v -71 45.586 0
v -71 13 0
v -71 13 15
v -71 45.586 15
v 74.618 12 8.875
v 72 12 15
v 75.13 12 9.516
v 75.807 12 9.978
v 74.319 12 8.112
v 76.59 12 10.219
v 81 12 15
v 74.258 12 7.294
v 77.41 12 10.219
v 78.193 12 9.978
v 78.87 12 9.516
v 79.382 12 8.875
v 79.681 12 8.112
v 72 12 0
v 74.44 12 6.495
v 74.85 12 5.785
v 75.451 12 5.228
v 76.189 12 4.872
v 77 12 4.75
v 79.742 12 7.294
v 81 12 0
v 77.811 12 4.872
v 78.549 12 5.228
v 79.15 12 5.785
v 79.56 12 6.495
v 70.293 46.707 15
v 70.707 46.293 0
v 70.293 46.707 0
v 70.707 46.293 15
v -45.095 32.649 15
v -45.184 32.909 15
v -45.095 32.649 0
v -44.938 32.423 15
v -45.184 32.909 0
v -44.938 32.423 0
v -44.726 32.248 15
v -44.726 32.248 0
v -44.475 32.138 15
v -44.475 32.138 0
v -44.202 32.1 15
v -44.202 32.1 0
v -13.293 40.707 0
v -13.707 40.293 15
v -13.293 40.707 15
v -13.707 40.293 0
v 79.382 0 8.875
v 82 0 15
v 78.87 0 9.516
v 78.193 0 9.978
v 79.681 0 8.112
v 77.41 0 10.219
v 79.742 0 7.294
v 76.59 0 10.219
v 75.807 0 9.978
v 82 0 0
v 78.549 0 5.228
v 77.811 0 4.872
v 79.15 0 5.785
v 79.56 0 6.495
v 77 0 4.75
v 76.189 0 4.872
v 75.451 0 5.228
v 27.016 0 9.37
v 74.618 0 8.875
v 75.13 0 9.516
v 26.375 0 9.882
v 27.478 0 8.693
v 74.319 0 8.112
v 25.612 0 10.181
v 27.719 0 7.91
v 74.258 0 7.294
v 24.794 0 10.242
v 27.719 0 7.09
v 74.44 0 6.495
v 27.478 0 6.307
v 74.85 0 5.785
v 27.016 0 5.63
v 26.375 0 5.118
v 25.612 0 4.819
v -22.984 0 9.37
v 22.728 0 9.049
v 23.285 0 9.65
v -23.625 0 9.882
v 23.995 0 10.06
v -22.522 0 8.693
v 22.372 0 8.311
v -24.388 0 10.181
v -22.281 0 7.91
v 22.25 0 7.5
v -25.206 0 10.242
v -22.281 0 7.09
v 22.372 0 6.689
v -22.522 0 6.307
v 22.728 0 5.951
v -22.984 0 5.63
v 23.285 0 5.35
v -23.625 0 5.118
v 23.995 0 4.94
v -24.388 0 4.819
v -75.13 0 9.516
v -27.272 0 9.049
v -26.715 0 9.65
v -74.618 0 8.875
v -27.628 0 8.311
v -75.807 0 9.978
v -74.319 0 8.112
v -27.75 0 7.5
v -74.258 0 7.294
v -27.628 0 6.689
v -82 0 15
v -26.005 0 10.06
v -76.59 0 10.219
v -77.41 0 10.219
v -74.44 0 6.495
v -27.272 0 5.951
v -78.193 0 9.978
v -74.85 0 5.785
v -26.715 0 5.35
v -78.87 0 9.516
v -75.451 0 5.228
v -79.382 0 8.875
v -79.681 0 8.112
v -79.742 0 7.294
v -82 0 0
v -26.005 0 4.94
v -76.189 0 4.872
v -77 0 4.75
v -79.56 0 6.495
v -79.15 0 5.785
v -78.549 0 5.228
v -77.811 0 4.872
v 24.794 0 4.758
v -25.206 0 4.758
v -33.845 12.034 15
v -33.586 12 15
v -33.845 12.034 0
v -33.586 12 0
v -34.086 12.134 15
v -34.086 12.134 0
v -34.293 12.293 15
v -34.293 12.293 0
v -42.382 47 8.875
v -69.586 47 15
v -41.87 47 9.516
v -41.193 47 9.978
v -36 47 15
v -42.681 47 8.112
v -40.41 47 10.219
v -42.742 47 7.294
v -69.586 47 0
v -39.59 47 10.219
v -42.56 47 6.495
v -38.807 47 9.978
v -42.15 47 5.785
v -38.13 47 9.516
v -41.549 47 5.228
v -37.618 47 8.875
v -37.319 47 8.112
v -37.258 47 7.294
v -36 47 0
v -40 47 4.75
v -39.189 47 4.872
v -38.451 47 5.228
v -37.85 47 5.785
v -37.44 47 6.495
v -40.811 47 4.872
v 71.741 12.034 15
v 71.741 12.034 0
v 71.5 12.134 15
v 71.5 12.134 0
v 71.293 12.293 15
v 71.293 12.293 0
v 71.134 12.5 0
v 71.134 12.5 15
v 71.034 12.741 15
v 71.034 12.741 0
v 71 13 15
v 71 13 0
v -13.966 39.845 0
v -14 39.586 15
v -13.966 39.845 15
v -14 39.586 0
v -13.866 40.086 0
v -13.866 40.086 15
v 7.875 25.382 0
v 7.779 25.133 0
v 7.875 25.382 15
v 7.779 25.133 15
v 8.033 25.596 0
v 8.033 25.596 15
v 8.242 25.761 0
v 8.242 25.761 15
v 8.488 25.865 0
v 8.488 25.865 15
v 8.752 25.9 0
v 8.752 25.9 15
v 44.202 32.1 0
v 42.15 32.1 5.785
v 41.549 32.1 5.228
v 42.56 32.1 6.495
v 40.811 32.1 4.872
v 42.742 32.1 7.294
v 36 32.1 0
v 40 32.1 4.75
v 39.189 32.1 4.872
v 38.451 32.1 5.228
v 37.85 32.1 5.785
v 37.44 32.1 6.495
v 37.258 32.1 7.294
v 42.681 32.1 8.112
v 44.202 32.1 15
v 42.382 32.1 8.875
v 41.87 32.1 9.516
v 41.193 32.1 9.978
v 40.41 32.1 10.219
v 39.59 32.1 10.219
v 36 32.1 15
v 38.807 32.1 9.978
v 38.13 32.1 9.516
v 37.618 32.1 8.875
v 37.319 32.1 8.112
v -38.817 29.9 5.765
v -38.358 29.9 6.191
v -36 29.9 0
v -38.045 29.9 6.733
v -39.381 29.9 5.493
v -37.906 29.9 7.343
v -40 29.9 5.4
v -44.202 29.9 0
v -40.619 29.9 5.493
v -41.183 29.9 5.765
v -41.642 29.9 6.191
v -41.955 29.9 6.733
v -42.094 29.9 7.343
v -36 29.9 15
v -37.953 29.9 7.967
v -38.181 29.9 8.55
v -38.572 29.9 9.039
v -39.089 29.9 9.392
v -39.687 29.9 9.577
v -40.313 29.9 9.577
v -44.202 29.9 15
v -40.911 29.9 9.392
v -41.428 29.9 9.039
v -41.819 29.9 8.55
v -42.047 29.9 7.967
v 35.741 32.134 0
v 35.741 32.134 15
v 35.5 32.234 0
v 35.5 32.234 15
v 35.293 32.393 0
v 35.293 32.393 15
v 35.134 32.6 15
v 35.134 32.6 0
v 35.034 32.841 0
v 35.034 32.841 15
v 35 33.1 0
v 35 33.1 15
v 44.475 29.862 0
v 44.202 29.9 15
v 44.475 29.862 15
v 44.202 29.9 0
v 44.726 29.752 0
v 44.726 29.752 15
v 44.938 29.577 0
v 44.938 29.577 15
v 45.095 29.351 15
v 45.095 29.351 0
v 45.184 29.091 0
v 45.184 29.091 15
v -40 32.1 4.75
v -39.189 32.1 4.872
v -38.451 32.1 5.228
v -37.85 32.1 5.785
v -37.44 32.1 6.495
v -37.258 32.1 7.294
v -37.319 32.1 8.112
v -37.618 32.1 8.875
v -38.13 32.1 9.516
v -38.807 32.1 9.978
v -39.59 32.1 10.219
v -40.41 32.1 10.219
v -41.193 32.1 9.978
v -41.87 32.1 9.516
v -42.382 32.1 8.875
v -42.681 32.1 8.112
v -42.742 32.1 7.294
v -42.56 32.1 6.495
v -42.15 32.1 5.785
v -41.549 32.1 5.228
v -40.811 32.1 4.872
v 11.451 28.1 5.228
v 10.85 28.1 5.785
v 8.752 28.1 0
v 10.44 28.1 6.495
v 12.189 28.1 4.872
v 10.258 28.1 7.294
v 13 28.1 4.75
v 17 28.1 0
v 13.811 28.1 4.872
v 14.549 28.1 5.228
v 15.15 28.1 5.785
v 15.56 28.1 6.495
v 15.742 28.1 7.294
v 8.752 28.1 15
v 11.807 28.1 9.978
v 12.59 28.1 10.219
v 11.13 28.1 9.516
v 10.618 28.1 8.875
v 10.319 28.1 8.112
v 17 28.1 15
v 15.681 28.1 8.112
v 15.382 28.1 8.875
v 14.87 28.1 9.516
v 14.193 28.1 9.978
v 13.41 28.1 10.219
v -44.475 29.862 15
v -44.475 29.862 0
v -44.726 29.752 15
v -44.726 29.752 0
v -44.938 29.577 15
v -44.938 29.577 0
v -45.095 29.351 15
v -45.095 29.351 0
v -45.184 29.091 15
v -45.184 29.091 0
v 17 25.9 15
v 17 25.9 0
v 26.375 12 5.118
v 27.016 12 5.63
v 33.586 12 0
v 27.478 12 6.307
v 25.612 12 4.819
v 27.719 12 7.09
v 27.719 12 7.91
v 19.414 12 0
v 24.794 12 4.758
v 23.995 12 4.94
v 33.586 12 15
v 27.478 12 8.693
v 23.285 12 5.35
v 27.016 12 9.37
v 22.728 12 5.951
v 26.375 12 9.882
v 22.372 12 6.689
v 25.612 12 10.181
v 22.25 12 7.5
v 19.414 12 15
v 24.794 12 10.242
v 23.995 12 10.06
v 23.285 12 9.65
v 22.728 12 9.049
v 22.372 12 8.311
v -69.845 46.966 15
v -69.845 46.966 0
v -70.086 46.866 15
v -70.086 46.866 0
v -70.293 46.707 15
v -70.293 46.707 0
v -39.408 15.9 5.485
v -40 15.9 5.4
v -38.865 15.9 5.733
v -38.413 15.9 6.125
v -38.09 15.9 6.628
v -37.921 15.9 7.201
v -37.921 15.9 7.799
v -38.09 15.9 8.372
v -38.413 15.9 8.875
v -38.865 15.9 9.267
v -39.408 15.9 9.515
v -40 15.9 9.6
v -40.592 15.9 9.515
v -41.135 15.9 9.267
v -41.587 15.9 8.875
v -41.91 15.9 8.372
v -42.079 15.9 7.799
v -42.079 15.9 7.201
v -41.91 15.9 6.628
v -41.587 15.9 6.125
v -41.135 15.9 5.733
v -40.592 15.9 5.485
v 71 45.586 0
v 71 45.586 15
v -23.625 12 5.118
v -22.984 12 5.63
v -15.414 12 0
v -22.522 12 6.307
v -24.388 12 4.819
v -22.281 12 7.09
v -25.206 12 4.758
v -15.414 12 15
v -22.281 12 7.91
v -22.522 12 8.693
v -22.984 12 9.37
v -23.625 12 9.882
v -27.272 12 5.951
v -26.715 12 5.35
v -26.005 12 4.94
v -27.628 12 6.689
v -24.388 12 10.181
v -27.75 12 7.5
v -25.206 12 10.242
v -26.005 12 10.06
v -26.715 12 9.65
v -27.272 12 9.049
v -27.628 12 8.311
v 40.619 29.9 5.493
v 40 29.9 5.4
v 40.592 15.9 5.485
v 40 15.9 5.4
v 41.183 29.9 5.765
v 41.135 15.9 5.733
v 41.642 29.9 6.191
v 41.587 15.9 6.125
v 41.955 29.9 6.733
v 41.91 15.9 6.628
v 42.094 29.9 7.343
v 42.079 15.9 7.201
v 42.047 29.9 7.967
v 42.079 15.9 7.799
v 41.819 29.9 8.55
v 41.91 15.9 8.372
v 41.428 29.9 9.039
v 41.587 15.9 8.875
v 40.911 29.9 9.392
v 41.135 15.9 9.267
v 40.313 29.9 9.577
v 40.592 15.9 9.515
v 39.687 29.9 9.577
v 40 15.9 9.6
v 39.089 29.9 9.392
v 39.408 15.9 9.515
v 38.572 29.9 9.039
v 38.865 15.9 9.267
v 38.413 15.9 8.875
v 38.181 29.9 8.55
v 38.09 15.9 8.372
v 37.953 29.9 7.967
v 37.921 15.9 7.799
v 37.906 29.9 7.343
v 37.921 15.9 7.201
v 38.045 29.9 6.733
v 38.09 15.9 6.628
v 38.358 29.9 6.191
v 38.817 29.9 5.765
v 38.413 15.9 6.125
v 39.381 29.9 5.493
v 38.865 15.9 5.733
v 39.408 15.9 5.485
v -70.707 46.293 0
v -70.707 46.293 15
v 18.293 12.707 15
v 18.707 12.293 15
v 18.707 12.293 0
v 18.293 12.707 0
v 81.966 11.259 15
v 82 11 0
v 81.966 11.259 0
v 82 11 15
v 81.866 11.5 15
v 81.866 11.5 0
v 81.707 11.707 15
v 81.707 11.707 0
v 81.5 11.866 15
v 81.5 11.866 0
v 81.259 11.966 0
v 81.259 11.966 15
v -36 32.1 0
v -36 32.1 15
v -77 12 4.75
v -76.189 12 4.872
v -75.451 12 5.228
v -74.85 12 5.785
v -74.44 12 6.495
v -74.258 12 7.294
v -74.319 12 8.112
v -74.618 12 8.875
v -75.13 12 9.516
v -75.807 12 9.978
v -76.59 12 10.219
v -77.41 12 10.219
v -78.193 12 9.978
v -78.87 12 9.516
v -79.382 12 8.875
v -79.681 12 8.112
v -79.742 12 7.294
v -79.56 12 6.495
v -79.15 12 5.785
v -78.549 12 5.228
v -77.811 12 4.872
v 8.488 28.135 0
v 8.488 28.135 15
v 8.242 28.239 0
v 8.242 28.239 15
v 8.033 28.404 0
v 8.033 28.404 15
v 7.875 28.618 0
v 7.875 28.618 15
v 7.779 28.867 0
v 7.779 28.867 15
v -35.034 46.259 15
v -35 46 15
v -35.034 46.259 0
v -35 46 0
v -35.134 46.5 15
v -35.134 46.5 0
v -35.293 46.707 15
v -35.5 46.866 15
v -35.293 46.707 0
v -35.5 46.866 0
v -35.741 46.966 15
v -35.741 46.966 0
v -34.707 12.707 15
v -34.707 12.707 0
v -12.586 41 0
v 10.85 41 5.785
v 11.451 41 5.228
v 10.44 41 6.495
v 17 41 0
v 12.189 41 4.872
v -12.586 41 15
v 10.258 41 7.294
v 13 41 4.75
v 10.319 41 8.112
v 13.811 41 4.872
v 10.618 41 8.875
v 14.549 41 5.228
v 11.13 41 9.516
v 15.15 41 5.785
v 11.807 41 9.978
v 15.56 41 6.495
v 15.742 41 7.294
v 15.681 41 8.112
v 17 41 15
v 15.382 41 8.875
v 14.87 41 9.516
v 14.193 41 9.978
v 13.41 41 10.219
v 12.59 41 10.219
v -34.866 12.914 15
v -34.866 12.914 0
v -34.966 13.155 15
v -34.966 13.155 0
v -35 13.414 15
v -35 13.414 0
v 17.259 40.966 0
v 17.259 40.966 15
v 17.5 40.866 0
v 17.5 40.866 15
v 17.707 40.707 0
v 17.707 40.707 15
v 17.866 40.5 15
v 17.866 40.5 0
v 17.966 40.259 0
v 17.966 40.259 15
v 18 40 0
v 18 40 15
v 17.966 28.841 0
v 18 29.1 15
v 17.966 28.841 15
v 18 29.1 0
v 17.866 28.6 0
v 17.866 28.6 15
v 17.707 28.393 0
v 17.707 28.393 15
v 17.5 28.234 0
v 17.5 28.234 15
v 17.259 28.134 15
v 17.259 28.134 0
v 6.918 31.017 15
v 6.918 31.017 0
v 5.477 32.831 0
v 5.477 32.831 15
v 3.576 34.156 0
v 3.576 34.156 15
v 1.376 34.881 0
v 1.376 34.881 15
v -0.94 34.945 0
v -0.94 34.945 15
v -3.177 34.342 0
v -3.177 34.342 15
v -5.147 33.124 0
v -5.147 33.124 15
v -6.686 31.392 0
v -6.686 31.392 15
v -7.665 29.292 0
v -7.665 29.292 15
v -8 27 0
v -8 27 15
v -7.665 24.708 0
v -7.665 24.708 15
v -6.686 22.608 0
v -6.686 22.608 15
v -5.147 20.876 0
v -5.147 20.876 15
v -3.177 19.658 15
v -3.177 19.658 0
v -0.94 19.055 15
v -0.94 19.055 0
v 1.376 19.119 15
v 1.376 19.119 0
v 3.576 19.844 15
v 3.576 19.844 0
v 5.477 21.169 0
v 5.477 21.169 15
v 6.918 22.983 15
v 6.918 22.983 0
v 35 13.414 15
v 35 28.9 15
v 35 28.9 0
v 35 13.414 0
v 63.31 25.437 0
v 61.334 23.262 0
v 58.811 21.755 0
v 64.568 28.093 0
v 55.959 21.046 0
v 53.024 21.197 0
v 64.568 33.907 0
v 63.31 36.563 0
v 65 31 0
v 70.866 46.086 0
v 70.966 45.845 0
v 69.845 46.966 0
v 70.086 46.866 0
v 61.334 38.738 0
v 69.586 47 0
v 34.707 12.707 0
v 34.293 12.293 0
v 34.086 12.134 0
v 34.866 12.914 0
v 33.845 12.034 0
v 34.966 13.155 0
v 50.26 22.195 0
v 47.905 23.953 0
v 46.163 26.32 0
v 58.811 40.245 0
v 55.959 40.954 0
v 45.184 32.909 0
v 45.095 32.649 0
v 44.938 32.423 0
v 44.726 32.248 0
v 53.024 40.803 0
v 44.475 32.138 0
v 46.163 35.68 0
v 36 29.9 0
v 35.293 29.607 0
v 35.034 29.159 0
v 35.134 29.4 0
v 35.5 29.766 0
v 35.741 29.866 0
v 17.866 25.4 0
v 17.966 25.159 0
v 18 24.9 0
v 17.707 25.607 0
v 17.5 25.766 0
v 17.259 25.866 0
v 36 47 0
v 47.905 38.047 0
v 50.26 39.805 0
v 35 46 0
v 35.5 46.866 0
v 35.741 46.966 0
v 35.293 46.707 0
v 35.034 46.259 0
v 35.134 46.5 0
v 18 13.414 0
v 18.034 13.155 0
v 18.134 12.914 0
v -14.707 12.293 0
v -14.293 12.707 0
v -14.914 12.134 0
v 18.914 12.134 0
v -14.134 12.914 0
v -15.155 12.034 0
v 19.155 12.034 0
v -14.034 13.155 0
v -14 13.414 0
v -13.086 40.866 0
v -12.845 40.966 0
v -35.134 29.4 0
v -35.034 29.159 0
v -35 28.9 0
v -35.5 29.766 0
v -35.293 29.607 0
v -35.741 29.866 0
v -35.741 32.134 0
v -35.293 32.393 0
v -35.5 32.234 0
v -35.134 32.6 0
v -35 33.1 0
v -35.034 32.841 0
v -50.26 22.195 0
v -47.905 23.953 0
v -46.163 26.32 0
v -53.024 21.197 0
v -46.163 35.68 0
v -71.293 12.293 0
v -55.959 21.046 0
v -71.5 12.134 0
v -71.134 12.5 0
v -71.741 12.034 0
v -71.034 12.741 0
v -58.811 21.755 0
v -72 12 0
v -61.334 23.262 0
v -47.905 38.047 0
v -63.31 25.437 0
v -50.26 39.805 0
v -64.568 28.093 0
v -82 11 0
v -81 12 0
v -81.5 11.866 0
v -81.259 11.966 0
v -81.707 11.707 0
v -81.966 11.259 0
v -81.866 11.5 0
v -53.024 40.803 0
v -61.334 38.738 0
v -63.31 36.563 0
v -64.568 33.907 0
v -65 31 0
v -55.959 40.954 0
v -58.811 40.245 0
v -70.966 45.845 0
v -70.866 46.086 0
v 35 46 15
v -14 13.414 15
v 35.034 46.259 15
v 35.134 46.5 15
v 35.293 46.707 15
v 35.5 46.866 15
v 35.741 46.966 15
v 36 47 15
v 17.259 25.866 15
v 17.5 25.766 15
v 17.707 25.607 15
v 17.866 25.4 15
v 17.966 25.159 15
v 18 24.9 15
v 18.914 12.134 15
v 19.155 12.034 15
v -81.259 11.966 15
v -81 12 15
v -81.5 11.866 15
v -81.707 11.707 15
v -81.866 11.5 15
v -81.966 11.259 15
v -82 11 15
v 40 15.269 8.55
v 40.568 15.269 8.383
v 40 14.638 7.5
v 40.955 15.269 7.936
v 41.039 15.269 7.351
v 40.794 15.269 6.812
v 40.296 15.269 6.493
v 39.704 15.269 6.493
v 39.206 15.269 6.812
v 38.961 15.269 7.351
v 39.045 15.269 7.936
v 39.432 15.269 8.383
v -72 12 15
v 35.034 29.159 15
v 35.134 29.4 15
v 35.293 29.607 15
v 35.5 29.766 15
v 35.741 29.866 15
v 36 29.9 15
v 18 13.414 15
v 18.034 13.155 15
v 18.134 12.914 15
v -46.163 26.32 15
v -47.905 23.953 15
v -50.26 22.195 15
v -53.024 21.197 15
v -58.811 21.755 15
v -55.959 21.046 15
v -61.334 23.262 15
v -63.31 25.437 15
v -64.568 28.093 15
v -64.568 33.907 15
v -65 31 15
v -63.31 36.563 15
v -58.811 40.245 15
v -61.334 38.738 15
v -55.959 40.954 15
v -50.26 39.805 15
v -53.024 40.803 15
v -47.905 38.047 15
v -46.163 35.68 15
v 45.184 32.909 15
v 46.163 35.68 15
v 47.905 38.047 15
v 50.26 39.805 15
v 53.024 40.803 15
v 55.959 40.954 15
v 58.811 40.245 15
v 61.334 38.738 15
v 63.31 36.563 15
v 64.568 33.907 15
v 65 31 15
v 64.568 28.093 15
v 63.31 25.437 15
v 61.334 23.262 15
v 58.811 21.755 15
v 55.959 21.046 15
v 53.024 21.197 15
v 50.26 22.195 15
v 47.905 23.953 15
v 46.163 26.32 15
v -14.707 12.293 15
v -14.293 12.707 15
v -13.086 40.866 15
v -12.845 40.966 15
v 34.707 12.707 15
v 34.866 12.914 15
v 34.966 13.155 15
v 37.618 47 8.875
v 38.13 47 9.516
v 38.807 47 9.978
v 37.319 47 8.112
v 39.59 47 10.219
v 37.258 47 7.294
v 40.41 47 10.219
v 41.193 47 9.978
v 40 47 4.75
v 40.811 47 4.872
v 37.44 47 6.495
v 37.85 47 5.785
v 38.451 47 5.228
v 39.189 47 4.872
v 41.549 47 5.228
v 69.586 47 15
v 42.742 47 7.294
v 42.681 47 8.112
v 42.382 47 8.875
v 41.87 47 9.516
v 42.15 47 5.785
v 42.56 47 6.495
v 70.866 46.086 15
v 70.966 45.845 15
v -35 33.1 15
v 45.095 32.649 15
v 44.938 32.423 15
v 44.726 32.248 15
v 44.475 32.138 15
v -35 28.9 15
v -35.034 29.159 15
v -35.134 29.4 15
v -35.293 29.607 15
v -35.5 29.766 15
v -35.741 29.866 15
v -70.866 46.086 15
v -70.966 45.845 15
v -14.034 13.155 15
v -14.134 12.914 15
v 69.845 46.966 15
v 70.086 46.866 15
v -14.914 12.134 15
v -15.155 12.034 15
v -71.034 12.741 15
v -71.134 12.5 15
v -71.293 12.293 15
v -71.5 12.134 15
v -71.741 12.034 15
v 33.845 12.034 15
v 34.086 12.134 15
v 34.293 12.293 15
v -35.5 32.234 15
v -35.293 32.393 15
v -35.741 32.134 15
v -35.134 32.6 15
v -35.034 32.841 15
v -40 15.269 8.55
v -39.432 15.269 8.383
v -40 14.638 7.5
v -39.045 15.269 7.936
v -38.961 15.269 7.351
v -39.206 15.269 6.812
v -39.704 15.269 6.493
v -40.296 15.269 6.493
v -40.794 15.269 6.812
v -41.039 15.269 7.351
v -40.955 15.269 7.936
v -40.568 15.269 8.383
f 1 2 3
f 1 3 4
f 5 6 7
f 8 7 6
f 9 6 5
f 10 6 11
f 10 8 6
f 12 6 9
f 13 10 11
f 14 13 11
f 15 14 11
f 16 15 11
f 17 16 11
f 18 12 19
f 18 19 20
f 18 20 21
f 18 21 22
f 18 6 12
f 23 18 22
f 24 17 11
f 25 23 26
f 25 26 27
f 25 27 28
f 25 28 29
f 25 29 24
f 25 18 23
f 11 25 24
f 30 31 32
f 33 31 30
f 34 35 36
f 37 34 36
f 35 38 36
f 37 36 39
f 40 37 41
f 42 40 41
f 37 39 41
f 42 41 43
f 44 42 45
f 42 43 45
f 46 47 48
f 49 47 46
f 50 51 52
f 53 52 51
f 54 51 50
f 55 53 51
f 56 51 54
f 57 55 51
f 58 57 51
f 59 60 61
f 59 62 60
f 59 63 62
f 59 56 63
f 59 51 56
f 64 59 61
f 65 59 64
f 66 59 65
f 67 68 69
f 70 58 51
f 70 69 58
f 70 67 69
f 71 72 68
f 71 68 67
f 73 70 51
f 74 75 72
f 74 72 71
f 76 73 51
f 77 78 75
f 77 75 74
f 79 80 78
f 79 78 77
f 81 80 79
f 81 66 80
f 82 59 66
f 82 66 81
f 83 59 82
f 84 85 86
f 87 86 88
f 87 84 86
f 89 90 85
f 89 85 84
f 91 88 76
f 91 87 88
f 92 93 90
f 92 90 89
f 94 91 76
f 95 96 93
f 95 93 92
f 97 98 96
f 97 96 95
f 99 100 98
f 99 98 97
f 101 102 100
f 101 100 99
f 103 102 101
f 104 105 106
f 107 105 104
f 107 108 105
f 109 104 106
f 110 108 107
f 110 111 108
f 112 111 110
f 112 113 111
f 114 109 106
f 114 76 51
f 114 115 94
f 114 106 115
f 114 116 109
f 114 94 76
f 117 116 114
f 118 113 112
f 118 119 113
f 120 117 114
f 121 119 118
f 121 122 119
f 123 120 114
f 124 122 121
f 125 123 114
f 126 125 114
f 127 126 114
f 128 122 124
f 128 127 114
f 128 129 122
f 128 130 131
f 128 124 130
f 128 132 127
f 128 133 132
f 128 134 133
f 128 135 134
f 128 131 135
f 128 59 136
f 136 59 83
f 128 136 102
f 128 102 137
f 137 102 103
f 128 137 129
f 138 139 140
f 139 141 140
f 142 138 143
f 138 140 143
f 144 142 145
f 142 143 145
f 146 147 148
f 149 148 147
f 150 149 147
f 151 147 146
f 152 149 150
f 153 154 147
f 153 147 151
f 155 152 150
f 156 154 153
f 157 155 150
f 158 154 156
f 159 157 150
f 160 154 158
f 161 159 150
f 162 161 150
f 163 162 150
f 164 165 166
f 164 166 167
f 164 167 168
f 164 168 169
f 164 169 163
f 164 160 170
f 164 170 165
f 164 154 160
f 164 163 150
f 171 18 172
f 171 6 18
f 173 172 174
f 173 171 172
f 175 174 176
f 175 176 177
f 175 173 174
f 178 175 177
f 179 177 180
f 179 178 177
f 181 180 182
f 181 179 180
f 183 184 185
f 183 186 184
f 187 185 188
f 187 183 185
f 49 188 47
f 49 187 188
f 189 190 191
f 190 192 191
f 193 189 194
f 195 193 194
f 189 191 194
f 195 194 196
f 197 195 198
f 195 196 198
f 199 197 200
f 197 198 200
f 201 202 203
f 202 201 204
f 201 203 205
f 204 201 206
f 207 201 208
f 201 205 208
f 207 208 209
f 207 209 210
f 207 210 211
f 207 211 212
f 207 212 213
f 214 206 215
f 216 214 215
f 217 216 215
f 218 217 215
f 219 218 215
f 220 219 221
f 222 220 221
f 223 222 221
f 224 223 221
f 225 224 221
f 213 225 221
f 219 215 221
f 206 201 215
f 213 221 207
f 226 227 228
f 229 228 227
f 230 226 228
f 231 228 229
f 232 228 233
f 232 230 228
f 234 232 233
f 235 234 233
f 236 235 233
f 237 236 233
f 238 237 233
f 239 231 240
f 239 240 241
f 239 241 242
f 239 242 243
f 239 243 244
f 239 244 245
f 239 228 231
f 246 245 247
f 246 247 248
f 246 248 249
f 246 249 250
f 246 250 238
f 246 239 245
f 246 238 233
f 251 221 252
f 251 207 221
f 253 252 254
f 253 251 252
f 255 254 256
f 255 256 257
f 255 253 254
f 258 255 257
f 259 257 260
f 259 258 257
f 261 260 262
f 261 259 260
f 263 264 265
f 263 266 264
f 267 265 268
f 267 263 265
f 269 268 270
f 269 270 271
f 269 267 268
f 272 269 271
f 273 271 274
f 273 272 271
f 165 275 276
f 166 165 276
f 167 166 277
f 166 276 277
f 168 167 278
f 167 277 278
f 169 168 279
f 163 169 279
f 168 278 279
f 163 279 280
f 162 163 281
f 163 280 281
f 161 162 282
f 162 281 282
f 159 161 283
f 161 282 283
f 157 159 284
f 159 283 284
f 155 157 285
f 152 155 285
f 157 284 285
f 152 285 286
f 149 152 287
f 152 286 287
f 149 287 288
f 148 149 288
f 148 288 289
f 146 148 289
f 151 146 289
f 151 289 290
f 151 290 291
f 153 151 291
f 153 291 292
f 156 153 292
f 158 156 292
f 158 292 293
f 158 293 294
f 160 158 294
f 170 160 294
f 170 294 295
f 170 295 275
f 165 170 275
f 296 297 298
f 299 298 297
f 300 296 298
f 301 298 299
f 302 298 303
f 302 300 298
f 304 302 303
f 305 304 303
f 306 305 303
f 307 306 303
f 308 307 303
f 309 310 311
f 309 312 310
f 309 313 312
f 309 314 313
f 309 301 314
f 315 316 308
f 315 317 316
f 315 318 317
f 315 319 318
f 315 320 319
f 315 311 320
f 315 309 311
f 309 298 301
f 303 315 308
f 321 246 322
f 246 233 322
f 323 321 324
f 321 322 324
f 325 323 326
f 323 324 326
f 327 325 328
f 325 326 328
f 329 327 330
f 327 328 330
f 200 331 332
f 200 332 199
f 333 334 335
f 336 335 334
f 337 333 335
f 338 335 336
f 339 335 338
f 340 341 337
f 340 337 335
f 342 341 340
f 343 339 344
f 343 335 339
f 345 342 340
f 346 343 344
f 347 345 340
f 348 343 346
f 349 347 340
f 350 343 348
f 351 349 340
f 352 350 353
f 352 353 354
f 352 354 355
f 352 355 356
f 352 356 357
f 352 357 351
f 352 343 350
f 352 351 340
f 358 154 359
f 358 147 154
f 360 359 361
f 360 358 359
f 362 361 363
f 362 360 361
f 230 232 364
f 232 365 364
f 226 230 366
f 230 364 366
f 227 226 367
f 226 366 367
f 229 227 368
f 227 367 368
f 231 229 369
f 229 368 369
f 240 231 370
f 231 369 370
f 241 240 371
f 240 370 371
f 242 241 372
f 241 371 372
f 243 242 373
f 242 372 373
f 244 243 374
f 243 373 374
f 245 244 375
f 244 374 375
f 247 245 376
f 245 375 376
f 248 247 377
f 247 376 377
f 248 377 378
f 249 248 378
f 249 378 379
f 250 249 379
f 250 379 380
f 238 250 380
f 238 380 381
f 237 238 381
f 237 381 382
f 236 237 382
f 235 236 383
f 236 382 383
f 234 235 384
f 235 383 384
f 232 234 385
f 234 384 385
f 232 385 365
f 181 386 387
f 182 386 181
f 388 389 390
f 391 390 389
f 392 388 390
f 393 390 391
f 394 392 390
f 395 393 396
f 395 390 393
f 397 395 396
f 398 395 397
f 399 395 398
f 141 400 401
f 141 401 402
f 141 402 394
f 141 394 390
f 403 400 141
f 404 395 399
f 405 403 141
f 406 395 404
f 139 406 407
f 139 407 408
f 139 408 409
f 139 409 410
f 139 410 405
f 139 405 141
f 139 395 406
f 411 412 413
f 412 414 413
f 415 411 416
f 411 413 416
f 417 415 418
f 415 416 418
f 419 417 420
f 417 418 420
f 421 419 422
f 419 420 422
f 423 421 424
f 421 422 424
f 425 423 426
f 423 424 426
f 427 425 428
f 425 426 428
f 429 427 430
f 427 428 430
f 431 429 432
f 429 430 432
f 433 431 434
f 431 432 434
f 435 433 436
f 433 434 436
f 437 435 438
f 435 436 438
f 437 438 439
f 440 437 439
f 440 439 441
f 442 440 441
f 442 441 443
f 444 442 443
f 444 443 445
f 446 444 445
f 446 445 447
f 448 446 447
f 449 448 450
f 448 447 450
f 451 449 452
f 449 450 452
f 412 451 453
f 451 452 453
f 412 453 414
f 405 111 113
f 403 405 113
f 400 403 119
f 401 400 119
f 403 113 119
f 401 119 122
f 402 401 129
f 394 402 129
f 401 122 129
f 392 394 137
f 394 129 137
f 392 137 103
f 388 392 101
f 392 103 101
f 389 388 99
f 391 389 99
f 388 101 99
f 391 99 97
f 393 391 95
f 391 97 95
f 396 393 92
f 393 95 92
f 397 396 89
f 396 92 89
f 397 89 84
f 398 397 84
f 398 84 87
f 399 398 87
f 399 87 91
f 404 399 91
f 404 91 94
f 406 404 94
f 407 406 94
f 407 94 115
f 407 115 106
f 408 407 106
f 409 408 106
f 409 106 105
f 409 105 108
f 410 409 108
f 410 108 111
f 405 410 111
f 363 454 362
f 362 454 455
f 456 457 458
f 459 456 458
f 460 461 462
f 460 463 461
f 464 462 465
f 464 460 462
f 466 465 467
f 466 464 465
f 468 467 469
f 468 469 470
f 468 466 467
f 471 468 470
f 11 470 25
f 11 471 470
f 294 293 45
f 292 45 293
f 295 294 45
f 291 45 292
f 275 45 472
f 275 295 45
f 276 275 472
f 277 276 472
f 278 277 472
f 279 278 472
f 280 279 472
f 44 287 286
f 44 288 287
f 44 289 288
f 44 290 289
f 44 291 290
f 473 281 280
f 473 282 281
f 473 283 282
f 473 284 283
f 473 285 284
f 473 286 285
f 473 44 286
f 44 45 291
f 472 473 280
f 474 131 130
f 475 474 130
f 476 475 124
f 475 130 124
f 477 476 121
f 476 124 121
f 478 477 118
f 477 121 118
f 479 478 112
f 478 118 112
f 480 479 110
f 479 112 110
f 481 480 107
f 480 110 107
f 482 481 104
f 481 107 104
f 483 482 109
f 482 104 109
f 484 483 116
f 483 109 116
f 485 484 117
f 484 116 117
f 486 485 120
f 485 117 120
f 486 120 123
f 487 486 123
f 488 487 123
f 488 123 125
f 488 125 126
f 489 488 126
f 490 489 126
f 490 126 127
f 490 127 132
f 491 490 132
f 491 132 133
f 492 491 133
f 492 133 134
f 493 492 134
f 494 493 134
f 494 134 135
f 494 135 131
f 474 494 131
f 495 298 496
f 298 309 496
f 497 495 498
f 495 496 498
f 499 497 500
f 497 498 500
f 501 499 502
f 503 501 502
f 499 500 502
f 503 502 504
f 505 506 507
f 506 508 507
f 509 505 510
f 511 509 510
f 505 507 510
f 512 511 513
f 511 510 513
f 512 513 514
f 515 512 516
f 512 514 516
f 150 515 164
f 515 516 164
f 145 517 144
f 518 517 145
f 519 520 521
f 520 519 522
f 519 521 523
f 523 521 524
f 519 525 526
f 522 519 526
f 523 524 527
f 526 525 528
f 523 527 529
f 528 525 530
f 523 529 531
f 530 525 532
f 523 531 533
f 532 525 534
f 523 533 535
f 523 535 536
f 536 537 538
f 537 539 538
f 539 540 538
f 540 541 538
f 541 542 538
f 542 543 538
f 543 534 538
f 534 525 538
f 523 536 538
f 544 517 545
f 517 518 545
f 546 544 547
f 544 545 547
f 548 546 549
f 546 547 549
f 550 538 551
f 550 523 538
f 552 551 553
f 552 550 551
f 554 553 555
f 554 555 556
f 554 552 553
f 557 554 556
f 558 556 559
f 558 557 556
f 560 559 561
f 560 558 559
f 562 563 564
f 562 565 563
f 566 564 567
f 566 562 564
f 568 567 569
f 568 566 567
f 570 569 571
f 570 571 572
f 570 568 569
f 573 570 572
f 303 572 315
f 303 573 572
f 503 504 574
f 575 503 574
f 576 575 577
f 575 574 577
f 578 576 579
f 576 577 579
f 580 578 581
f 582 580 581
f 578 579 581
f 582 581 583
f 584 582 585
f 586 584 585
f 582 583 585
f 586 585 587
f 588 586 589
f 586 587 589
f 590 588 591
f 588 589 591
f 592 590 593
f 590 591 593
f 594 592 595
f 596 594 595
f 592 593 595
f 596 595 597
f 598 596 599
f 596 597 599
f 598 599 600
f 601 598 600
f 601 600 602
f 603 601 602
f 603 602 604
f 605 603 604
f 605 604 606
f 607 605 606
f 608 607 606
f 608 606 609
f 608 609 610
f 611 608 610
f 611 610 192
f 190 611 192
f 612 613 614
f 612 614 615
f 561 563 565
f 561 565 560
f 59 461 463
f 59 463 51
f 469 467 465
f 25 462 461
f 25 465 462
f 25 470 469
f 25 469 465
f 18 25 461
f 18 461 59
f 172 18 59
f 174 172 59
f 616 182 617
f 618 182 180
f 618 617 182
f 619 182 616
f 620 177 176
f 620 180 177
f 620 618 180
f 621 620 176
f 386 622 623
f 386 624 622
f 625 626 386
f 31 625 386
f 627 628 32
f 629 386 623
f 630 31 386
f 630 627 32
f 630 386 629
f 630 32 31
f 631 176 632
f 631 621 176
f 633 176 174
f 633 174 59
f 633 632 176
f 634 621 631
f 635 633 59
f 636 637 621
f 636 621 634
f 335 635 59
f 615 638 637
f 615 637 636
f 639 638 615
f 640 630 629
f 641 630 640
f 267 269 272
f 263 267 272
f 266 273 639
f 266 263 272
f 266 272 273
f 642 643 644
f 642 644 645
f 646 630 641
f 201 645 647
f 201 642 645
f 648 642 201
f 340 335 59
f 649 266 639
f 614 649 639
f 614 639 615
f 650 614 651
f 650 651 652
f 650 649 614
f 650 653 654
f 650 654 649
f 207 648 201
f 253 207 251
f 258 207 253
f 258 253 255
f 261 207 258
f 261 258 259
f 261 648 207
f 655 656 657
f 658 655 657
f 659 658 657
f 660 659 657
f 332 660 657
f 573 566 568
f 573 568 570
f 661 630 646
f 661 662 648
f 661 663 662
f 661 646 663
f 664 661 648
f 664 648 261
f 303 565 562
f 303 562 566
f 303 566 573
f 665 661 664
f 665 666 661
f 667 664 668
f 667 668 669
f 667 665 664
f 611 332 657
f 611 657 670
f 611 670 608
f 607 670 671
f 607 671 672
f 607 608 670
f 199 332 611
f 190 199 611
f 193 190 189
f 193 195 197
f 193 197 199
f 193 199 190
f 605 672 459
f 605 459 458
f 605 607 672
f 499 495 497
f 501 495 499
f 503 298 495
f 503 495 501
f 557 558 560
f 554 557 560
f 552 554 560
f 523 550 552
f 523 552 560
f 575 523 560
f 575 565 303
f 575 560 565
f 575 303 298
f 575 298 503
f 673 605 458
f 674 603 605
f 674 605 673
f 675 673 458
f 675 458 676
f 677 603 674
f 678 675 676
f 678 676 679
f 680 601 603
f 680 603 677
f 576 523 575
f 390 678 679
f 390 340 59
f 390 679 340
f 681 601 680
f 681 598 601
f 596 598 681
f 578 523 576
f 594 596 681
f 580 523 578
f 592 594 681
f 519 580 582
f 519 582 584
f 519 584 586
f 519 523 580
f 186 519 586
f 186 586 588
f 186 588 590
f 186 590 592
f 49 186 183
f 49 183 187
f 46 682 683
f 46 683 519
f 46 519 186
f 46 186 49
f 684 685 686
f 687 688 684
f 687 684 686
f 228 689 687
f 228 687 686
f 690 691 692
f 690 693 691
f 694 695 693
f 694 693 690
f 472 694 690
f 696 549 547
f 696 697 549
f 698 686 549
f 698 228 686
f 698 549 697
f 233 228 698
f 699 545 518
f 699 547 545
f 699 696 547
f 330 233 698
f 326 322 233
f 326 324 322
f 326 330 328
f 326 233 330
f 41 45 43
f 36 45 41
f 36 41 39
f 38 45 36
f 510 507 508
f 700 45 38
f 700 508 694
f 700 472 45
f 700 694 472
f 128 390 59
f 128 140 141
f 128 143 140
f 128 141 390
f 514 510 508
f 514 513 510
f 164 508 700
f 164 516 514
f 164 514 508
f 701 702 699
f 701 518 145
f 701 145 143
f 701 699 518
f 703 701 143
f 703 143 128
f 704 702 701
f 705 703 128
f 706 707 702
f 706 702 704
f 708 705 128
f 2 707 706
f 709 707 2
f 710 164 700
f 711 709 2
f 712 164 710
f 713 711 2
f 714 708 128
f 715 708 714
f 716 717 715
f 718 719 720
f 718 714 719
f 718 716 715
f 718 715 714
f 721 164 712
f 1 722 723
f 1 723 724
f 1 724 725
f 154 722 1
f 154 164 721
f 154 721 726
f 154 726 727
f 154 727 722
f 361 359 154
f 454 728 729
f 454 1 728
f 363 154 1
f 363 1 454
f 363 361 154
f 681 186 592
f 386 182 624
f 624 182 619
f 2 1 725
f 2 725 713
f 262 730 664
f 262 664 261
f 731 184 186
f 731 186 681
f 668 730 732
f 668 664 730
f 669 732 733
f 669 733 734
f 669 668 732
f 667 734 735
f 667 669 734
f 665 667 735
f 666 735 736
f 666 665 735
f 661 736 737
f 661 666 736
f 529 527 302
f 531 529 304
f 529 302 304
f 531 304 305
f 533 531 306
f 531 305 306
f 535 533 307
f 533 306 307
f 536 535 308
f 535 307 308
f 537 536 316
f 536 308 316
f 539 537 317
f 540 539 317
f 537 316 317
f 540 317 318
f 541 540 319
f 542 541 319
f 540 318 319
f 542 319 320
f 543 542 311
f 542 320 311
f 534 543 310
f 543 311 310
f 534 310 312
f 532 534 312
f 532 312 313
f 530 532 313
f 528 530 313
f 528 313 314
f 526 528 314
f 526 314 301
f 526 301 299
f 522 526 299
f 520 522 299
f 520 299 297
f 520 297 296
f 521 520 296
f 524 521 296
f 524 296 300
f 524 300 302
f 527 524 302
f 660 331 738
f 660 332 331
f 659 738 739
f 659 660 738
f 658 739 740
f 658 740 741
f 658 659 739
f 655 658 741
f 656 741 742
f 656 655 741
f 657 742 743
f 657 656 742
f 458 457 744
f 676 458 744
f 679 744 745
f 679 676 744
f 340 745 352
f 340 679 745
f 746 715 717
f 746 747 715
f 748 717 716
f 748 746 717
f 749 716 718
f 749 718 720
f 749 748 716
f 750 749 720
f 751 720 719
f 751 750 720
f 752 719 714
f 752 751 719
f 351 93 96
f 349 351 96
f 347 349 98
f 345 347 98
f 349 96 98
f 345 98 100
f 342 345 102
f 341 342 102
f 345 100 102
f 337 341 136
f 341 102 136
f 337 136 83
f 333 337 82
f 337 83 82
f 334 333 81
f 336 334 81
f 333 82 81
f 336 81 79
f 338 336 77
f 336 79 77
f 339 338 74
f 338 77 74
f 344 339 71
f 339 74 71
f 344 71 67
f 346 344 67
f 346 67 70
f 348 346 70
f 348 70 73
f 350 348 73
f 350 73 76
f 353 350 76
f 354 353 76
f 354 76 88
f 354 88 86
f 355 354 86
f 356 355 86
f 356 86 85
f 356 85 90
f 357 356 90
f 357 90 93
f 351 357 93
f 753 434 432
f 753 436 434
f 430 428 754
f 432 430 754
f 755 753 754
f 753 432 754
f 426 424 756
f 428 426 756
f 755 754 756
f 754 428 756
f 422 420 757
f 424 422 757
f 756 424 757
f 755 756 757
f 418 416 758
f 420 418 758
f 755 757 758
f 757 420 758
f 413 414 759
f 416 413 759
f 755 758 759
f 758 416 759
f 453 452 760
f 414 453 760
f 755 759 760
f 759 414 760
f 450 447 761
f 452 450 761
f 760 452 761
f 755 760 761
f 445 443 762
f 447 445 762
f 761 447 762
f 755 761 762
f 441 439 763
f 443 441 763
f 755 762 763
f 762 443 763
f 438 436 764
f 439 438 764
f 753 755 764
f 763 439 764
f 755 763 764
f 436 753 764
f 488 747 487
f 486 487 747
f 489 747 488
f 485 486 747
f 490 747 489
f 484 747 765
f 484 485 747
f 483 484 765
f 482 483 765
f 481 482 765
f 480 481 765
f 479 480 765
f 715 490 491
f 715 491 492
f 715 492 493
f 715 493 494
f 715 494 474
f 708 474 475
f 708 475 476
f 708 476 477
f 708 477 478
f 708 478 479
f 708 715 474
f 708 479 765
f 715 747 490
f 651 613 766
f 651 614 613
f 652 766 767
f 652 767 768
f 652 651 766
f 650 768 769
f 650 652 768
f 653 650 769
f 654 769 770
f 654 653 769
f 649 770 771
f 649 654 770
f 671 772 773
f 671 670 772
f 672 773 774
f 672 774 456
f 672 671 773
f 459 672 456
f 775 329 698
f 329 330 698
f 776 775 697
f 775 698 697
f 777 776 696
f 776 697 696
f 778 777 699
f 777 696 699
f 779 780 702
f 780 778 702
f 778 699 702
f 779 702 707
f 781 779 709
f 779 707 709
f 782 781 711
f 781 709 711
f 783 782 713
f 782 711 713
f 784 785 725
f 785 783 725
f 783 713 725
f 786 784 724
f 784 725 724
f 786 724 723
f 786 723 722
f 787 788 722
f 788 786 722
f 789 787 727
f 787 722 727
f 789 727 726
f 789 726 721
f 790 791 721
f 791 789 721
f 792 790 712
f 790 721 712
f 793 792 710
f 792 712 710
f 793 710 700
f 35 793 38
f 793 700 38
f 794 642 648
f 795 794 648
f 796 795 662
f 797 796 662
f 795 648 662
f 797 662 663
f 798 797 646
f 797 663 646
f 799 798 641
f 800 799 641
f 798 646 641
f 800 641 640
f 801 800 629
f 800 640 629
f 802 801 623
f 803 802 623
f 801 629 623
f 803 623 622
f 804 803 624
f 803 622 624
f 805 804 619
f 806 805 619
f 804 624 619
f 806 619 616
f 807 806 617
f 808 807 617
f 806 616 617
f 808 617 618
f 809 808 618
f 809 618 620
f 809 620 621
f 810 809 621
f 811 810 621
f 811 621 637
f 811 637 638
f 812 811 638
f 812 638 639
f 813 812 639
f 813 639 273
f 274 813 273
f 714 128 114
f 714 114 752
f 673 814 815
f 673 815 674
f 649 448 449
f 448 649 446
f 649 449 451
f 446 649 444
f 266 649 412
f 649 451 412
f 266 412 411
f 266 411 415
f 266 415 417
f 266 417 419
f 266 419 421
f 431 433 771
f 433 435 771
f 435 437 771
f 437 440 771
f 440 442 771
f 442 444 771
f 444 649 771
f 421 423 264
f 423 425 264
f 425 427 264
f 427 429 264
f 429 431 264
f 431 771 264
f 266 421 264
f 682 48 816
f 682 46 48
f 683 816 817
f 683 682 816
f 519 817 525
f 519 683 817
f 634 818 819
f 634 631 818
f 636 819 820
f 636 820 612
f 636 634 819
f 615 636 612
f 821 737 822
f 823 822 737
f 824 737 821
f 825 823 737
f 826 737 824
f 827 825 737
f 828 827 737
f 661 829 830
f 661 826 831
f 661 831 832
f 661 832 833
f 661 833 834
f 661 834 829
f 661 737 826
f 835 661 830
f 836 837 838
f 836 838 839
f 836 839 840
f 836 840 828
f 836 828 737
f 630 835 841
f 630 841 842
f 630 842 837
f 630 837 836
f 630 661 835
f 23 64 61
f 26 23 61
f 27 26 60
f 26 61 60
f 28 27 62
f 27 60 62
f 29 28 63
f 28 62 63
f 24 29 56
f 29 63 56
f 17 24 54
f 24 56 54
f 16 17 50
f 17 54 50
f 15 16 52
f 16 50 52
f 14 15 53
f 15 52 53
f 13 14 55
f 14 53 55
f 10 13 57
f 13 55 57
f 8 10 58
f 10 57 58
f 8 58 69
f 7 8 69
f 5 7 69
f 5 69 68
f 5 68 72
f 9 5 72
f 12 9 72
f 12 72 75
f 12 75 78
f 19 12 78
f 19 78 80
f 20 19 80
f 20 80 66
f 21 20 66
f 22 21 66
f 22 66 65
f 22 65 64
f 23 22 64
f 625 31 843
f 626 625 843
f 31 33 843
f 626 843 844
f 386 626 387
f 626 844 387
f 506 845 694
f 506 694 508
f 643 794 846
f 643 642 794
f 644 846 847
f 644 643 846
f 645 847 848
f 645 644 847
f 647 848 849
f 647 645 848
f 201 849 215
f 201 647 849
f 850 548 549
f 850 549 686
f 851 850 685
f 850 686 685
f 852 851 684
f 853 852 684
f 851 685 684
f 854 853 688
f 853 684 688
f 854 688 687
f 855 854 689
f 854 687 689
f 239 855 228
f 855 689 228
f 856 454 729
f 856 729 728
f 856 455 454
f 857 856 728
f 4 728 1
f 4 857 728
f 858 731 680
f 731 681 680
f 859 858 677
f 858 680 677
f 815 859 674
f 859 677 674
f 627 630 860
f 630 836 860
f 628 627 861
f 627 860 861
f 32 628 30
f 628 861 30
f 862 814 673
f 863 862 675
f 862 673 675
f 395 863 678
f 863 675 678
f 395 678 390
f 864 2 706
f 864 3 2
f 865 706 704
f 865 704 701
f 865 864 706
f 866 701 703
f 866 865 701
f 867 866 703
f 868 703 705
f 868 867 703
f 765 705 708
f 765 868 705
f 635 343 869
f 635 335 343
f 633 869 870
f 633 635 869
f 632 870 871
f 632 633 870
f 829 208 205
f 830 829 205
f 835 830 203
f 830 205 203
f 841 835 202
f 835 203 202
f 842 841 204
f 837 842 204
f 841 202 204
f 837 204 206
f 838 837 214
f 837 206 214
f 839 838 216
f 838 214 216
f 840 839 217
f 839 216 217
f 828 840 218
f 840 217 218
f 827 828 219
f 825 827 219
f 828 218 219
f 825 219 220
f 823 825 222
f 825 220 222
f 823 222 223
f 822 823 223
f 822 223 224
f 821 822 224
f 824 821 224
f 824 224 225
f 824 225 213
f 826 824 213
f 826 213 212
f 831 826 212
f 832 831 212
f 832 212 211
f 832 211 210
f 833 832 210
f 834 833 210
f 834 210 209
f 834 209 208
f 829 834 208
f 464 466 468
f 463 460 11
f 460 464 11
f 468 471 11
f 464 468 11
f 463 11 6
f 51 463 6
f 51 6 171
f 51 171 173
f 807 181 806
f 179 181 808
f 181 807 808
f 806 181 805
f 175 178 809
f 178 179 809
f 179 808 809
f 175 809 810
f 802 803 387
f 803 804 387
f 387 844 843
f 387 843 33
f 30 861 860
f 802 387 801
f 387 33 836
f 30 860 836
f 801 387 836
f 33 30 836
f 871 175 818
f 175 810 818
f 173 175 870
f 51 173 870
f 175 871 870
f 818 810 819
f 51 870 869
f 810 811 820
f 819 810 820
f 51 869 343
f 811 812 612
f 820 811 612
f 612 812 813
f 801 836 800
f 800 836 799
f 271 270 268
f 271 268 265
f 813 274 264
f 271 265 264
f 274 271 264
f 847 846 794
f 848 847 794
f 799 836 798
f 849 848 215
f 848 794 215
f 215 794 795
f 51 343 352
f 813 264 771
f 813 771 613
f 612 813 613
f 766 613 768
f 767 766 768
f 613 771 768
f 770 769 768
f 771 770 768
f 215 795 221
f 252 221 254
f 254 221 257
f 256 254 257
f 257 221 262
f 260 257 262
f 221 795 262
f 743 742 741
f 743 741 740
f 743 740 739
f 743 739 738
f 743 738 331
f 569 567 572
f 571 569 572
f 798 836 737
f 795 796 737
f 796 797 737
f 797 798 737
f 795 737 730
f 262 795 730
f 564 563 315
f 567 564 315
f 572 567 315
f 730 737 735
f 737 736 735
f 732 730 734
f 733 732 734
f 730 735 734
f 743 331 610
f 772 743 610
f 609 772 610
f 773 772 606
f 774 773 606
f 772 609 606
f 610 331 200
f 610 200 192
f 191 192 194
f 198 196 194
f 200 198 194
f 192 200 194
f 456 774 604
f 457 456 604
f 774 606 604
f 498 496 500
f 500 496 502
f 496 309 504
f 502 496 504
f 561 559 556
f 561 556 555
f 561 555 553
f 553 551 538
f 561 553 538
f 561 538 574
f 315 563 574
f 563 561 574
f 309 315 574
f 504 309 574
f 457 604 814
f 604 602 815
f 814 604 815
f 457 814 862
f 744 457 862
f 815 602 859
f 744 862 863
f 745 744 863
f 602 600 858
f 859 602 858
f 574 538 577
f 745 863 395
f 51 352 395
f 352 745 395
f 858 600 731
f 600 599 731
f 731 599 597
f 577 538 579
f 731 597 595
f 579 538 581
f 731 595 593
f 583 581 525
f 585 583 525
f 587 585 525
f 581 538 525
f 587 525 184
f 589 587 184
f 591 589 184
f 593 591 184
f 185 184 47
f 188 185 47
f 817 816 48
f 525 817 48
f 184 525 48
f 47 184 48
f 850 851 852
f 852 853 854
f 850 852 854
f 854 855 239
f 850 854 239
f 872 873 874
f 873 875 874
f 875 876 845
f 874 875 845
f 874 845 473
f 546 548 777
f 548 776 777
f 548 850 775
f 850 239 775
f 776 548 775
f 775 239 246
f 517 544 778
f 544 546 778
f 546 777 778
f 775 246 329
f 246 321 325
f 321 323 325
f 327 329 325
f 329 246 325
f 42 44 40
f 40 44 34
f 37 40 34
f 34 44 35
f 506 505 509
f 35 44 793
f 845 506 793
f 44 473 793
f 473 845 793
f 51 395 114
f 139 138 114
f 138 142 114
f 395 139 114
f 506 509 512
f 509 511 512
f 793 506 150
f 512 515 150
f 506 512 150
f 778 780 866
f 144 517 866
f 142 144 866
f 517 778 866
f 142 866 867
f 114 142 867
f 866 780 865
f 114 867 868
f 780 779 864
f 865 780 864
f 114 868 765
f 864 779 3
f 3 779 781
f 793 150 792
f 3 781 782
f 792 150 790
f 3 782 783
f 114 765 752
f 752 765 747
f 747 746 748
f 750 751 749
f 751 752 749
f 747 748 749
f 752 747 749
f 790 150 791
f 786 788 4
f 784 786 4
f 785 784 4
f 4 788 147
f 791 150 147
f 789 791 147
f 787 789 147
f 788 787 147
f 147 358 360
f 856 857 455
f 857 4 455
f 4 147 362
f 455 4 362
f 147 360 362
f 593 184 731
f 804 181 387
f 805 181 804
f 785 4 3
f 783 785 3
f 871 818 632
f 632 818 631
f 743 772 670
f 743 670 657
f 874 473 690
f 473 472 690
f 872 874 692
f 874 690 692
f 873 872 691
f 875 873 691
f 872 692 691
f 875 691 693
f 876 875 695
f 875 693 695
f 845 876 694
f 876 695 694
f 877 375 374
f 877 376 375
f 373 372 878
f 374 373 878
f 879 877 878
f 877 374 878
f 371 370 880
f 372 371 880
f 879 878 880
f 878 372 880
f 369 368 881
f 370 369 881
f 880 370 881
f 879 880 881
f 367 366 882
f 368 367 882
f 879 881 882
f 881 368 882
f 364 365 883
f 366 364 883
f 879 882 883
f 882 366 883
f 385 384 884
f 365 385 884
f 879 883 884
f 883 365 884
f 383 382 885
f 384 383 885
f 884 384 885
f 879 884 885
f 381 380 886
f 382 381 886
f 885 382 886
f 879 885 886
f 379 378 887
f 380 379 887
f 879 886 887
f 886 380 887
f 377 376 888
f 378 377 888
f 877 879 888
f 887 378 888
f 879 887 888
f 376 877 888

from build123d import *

# Parameters (mm, degrees)
BOSS_EXTRUDE1_DEPTH            = 15
CUT_EXTRUDE1_REACH             = 17
SKETCH2_R                      = 8
CUT_EXTRUDE2_REACH             = 17
SKETCH3_R                      = 10
F_5_5_5_5_DIAMETER_HOLE1_D     = 5.5
F_5_5_5_5_DIAMETER_HOLE1_DEPTH = 12
CUT_EXTRUDE3_REACH             = 17
CUT_EXTRUDE4_REACH             = 17
F_5_5_5_5_DIAMETER_HOLE2_D     = 5.5
F_5_5_5_5_DIAMETER_HOLE2_DEPTH = 14.9
F_5_5_5_5_DIAMETER_HOLE3_D     = 5.5
F_5_5_5_5_DIAMETER_HOLE3_DEPTH = 18.9
M5_TAPPED_HOLE2_D              = 4.2
M5_TAPPED_HOLE2_DEPTH          = 14
M5_TAPPED_HOLE2_TIP            = 1.2618073
CHAMFER1_SIZE                  = 1
CHAMFER2_SIZE                  = 1
CHAMFER3_SIZE                  = 1
FILLET1_R                      = 1
F_5_5_5_5_DIAMETER_HOLE4_D     = 5.5


with BuildPart() as part:
    # Sketch1 → Boss-Extrude1 (new body)
    with BuildSketch(Plane.XY):
        Polygon((82, 0), (-82, 0), (-82, 12), (-71, 12), (-71, 47), (71, 47), (71, 12), (82, 12), align=None)
    extrude(amount=BOSS_EXTRUDE1_DEPTH)

    # Sketch2 → Cut-Extrude1 (cut, up to next)
    with BuildSketch(Plane.XY.offset(15), mode=Mode.PRIVATE) as cut_extrude1_sk1:
        with Locations((0, 27)):
            Circle(SKETCH2_R)
    cut_extrude1_tool1 = extrude(cut_extrude1_sk1.sketch, amount=-CUT_EXTRUDE1_REACH, mode=Mode.PRIVATE) & part.part
    add(cut_extrude1_tool1.solids().sort_by_distance((0, 27, 15))[0], mode=Mode.SUBTRACT)

    # Sketch3 → Cut-Extrude2 (cut, up to next)
    with BuildSketch(Plane(origin=(0, 0, 0), x_dir=(-1, 0, 0), z_dir=(0, 0, -1)), mode=Mode.PRIVATE) as cut_extrude2_sk1:
        with Locations((-55, 31)):
            Circle(SKETCH3_R)
    cut_extrude2_tool1 = extrude(cut_extrude2_sk1.sketch, amount=-CUT_EXTRUDE2_REACH, mode=Mode.PRIVATE) & part.part
    add(cut_extrude2_tool1.solids().sort_by_distance((55, 31, 0))[0], mode=Mode.SUBTRACT)
    # Sketch3 → Cut-Extrude2 (cut, up to next)
    with BuildSketch(Plane(origin=(0, 0, 0), x_dir=(-1, 0, 0), z_dir=(0, 0, -1)), mode=Mode.PRIVATE) as cut_extrude2_sk2:
        with Locations((55, 31)):
            Circle(SKETCH3_R)
    cut_extrude2_tool2 = extrude(cut_extrude2_sk2.sketch, amount=-CUT_EXTRUDE2_REACH, mode=Mode.PRIVATE) & part.part
    add(cut_extrude2_tool2.solids().sort_by_distance((-55, 31, 0))[0], mode=Mode.SUBTRACT)

    # Ø5.5 (5.5) Diameter Hole1
    with Locations(Plane(origin=(-77, 12, 7.5), x_dir=(0, 0, 1), z_dir=(0, 1, 0))):
        with Locations((0, 0), (0, 154)):
            Hole(F_5_5_5_5_DIAMETER_HOLE1_D / 2, depth=F_5_5_5_5_DIAMETER_HOLE1_DEPTH)

    # Sketch9 → Cut-Extrude3 (cut, up to next)
    with BuildSketch(Plane.XY.offset(15), mode=Mode.PRIVATE) as cut_extrude3_sk1:
        Polygon((0, 41), (-14, 41), (-14, 12), (-35, 12), (-35, 47), (35, 47), (35, 12), (18, 12), (18, 41), align=None)
    cut_extrude3_tool1 = extrude(cut_extrude3_sk1.sketch, amount=-CUT_EXTRUDE3_REACH, mode=Mode.PRIVATE) & part.part
    add(cut_extrude3_tool1.solids().sort_by_distance((-7, 41.782624, 15))[0], mode=Mode.SUBTRACT)

    # Sketch10 → Cut-Extrude4 (cut, up to next)
    with BuildSketch(Plane.XY.offset(15), mode=Mode.PRIVATE) as cut_extrude4_sk1:
        Polygon((-55, 31), (-55, 32.1), (-35, 32.1), (-35, 29.9), (-55, 29.9), align=None)
    cut_extrude4_tool1 = extrude(cut_extrude4_sk1.sketch, amount=-CUT_EXTRUDE4_REACH, mode=Mode.PRIVATE) & part.part
    add(cut_extrude4_tool1.solids().sort_by_distance((-45, 31, 15))[0], mode=Mode.SUBTRACT)
    # Sketch10 → Cut-Extrude4 (cut, up to next)
    with BuildSketch(Plane.XY.offset(15), mode=Mode.PRIVATE) as cut_extrude4_sk2:
        Polygon((55, 31), (55, 32.1), (35, 32.1), (35, 29.9), (55, 29.9), align=None)
    cut_extrude4_tool2 = extrude(cut_extrude4_sk2.sketch, amount=-CUT_EXTRUDE4_REACH, mode=Mode.PRIVATE) & part.part
    add(cut_extrude4_tool2.solids().sort_by_distance((45, 31, 15))[0], mode=Mode.SUBTRACT)
    # Sketch10 → Cut-Extrude4 (cut, up to next)
    with BuildSketch(Plane.XY.offset(15), mode=Mode.PRIVATE) as cut_extrude4_sk3:
        Polygon((0, 27), (0, 28.1), (18, 28.1), (18, 25.9), (0, 25.9), align=None)
    cut_extrude4_tool3 = extrude(cut_extrude4_sk3.sketch, amount=-CUT_EXTRUDE4_REACH, mode=Mode.PRIVATE) & part.part
    add(cut_extrude4_tool3.solids().sort_by_distance((9, 27, 15))[0], mode=Mode.SUBTRACT)

    # Ø5.5 (5.5) Diameter Hole2
    with Locations(Plane(origin=(-40, 47, 7.5), x_dir=(0, 0, 1), z_dir=(0, 1, 0))):
        with Locations((0, 0), (0, 80)):
            Hole(F_5_5_5_5_DIAMETER_HOLE2_D / 2, depth=F_5_5_5_5_DIAMETER_HOLE2_DEPTH)

    # Ø5.5 (5.5) Diameter Hole3
    with Locations(Plane(origin=(13, 47, 7.5), x_dir=(0, 0, 1), z_dir=(0, 1, 0))):
        with Locations((0, 0)):
            Hole(F_5_5_5_5_DIAMETER_HOLE3_D / 2, depth=F_5_5_5_5_DIAMETER_HOLE3_DEPTH)

    # M5 Tapped Hole2
    with Locations(Plane(origin=(-40, 29.9, 7.5), x_dir=(0, 0, 1), z_dir=(0, 1, 0))):
        with Locations((0, 0), (0, 80)):
            Hole(M5_TAPPED_HOLE2_D / 2, depth=M5_TAPPED_HOLE2_DEPTH)
            with Locations((0, 0, -(M5_TAPPED_HOLE2_DEPTH + M5_TAPPED_HOLE2_TIP / 2))):  # 118° drill point
                Cone(0, M5_TAPPED_HOLE2_D / 2, M5_TAPPED_HOLE2_TIP, mode=Mode.SUBTRACT)

    # Chamfer1
    chamfer1_edges = [part.edges().sort_by_distance(p)[0] for p in [
        (-71, 47, 7.5),
        (71, 47, 7.5),
    ]]
    chamfer(chamfer1_edges, length=CHAMFER1_SIZE)

    # Chamfer2
    chamfer2_edges = [part.edges().sort_by_distance(p)[0] for p in [
        (-14, 41, 7.5),
    ]]
    chamfer(chamfer2_edges, length=CHAMFER2_SIZE)

    # Chamfer3
    chamfer3_edges = [part.edges().sort_by_distance(p)[0] for p in [
        (-14, 12, 7.5),
        (-35, 12, 7.5),
        (35, 12, 7.5),
        (18, 12, 7.5),
    ]]
    chamfer(chamfer3_edges, length=CHAMFER3_SIZE)

    # Fillet1
    fillet1_edges = [part.edges().sort_by_distance(p)[0] for p in [
        (35, 29.9, 7.5),
        (35, 32.1, 7.5),
        (45.060684128, 29.9, 7.5),
        (45.060684128, 32.1, 7.5),
        (18, 28.1, 7.5),
        (18, 25.9, 7.5),
        (7.924014134, 28.1, 7.5),
        (7.924014134, 25.9, 7.5),
        (71, 12, 7.5),
        (82, 12, 7.5),
        (-82, 12, 7.5),
        (-71, 12, 7.5),
        (-71, 46, 7.5),
        (-70, 47, 7.5),
        (70, 47, 7.5),
        (71, 46, 7.5),
        (-13, 41, 7.5),
        (-14, 40, 7.5),
        (35, 13, 7.5),
        (19, 12, 7.5),
        (34, 12, 7.5),
        (18, 13, 7.5),
        (-14, 13, 7.5),
        (-34, 12, 7.5),
        (-15, 12, 7.5),
        (-35, 13, 7.5),
        (18, 41, 7.5),
        (-35, 47, 7.5),
        (35, 47, 7.5),
        (-45.060684128, 32.1, 7.5),
        (-45.060684128, 29.9, 7.5),
        (-35, 32.1, 7.5),
        (-35, 29.9, 7.5),
    ]]
    fillet(fillet1_edges, radius=FILLET1_R)

    # Ø5.5 (5.5) Diameter Hole4 (through all)
    with Locations(Plane(origin=(-25, 12, 7.5), x_dir=(1, 0, 0), z_dir=(0, 1, 0))):
        with Locations((0, 0), (50, 0)):
            Hole(F_5_5_5_5_DIAMETER_HOLE4_D / 2)


solid = part.part
